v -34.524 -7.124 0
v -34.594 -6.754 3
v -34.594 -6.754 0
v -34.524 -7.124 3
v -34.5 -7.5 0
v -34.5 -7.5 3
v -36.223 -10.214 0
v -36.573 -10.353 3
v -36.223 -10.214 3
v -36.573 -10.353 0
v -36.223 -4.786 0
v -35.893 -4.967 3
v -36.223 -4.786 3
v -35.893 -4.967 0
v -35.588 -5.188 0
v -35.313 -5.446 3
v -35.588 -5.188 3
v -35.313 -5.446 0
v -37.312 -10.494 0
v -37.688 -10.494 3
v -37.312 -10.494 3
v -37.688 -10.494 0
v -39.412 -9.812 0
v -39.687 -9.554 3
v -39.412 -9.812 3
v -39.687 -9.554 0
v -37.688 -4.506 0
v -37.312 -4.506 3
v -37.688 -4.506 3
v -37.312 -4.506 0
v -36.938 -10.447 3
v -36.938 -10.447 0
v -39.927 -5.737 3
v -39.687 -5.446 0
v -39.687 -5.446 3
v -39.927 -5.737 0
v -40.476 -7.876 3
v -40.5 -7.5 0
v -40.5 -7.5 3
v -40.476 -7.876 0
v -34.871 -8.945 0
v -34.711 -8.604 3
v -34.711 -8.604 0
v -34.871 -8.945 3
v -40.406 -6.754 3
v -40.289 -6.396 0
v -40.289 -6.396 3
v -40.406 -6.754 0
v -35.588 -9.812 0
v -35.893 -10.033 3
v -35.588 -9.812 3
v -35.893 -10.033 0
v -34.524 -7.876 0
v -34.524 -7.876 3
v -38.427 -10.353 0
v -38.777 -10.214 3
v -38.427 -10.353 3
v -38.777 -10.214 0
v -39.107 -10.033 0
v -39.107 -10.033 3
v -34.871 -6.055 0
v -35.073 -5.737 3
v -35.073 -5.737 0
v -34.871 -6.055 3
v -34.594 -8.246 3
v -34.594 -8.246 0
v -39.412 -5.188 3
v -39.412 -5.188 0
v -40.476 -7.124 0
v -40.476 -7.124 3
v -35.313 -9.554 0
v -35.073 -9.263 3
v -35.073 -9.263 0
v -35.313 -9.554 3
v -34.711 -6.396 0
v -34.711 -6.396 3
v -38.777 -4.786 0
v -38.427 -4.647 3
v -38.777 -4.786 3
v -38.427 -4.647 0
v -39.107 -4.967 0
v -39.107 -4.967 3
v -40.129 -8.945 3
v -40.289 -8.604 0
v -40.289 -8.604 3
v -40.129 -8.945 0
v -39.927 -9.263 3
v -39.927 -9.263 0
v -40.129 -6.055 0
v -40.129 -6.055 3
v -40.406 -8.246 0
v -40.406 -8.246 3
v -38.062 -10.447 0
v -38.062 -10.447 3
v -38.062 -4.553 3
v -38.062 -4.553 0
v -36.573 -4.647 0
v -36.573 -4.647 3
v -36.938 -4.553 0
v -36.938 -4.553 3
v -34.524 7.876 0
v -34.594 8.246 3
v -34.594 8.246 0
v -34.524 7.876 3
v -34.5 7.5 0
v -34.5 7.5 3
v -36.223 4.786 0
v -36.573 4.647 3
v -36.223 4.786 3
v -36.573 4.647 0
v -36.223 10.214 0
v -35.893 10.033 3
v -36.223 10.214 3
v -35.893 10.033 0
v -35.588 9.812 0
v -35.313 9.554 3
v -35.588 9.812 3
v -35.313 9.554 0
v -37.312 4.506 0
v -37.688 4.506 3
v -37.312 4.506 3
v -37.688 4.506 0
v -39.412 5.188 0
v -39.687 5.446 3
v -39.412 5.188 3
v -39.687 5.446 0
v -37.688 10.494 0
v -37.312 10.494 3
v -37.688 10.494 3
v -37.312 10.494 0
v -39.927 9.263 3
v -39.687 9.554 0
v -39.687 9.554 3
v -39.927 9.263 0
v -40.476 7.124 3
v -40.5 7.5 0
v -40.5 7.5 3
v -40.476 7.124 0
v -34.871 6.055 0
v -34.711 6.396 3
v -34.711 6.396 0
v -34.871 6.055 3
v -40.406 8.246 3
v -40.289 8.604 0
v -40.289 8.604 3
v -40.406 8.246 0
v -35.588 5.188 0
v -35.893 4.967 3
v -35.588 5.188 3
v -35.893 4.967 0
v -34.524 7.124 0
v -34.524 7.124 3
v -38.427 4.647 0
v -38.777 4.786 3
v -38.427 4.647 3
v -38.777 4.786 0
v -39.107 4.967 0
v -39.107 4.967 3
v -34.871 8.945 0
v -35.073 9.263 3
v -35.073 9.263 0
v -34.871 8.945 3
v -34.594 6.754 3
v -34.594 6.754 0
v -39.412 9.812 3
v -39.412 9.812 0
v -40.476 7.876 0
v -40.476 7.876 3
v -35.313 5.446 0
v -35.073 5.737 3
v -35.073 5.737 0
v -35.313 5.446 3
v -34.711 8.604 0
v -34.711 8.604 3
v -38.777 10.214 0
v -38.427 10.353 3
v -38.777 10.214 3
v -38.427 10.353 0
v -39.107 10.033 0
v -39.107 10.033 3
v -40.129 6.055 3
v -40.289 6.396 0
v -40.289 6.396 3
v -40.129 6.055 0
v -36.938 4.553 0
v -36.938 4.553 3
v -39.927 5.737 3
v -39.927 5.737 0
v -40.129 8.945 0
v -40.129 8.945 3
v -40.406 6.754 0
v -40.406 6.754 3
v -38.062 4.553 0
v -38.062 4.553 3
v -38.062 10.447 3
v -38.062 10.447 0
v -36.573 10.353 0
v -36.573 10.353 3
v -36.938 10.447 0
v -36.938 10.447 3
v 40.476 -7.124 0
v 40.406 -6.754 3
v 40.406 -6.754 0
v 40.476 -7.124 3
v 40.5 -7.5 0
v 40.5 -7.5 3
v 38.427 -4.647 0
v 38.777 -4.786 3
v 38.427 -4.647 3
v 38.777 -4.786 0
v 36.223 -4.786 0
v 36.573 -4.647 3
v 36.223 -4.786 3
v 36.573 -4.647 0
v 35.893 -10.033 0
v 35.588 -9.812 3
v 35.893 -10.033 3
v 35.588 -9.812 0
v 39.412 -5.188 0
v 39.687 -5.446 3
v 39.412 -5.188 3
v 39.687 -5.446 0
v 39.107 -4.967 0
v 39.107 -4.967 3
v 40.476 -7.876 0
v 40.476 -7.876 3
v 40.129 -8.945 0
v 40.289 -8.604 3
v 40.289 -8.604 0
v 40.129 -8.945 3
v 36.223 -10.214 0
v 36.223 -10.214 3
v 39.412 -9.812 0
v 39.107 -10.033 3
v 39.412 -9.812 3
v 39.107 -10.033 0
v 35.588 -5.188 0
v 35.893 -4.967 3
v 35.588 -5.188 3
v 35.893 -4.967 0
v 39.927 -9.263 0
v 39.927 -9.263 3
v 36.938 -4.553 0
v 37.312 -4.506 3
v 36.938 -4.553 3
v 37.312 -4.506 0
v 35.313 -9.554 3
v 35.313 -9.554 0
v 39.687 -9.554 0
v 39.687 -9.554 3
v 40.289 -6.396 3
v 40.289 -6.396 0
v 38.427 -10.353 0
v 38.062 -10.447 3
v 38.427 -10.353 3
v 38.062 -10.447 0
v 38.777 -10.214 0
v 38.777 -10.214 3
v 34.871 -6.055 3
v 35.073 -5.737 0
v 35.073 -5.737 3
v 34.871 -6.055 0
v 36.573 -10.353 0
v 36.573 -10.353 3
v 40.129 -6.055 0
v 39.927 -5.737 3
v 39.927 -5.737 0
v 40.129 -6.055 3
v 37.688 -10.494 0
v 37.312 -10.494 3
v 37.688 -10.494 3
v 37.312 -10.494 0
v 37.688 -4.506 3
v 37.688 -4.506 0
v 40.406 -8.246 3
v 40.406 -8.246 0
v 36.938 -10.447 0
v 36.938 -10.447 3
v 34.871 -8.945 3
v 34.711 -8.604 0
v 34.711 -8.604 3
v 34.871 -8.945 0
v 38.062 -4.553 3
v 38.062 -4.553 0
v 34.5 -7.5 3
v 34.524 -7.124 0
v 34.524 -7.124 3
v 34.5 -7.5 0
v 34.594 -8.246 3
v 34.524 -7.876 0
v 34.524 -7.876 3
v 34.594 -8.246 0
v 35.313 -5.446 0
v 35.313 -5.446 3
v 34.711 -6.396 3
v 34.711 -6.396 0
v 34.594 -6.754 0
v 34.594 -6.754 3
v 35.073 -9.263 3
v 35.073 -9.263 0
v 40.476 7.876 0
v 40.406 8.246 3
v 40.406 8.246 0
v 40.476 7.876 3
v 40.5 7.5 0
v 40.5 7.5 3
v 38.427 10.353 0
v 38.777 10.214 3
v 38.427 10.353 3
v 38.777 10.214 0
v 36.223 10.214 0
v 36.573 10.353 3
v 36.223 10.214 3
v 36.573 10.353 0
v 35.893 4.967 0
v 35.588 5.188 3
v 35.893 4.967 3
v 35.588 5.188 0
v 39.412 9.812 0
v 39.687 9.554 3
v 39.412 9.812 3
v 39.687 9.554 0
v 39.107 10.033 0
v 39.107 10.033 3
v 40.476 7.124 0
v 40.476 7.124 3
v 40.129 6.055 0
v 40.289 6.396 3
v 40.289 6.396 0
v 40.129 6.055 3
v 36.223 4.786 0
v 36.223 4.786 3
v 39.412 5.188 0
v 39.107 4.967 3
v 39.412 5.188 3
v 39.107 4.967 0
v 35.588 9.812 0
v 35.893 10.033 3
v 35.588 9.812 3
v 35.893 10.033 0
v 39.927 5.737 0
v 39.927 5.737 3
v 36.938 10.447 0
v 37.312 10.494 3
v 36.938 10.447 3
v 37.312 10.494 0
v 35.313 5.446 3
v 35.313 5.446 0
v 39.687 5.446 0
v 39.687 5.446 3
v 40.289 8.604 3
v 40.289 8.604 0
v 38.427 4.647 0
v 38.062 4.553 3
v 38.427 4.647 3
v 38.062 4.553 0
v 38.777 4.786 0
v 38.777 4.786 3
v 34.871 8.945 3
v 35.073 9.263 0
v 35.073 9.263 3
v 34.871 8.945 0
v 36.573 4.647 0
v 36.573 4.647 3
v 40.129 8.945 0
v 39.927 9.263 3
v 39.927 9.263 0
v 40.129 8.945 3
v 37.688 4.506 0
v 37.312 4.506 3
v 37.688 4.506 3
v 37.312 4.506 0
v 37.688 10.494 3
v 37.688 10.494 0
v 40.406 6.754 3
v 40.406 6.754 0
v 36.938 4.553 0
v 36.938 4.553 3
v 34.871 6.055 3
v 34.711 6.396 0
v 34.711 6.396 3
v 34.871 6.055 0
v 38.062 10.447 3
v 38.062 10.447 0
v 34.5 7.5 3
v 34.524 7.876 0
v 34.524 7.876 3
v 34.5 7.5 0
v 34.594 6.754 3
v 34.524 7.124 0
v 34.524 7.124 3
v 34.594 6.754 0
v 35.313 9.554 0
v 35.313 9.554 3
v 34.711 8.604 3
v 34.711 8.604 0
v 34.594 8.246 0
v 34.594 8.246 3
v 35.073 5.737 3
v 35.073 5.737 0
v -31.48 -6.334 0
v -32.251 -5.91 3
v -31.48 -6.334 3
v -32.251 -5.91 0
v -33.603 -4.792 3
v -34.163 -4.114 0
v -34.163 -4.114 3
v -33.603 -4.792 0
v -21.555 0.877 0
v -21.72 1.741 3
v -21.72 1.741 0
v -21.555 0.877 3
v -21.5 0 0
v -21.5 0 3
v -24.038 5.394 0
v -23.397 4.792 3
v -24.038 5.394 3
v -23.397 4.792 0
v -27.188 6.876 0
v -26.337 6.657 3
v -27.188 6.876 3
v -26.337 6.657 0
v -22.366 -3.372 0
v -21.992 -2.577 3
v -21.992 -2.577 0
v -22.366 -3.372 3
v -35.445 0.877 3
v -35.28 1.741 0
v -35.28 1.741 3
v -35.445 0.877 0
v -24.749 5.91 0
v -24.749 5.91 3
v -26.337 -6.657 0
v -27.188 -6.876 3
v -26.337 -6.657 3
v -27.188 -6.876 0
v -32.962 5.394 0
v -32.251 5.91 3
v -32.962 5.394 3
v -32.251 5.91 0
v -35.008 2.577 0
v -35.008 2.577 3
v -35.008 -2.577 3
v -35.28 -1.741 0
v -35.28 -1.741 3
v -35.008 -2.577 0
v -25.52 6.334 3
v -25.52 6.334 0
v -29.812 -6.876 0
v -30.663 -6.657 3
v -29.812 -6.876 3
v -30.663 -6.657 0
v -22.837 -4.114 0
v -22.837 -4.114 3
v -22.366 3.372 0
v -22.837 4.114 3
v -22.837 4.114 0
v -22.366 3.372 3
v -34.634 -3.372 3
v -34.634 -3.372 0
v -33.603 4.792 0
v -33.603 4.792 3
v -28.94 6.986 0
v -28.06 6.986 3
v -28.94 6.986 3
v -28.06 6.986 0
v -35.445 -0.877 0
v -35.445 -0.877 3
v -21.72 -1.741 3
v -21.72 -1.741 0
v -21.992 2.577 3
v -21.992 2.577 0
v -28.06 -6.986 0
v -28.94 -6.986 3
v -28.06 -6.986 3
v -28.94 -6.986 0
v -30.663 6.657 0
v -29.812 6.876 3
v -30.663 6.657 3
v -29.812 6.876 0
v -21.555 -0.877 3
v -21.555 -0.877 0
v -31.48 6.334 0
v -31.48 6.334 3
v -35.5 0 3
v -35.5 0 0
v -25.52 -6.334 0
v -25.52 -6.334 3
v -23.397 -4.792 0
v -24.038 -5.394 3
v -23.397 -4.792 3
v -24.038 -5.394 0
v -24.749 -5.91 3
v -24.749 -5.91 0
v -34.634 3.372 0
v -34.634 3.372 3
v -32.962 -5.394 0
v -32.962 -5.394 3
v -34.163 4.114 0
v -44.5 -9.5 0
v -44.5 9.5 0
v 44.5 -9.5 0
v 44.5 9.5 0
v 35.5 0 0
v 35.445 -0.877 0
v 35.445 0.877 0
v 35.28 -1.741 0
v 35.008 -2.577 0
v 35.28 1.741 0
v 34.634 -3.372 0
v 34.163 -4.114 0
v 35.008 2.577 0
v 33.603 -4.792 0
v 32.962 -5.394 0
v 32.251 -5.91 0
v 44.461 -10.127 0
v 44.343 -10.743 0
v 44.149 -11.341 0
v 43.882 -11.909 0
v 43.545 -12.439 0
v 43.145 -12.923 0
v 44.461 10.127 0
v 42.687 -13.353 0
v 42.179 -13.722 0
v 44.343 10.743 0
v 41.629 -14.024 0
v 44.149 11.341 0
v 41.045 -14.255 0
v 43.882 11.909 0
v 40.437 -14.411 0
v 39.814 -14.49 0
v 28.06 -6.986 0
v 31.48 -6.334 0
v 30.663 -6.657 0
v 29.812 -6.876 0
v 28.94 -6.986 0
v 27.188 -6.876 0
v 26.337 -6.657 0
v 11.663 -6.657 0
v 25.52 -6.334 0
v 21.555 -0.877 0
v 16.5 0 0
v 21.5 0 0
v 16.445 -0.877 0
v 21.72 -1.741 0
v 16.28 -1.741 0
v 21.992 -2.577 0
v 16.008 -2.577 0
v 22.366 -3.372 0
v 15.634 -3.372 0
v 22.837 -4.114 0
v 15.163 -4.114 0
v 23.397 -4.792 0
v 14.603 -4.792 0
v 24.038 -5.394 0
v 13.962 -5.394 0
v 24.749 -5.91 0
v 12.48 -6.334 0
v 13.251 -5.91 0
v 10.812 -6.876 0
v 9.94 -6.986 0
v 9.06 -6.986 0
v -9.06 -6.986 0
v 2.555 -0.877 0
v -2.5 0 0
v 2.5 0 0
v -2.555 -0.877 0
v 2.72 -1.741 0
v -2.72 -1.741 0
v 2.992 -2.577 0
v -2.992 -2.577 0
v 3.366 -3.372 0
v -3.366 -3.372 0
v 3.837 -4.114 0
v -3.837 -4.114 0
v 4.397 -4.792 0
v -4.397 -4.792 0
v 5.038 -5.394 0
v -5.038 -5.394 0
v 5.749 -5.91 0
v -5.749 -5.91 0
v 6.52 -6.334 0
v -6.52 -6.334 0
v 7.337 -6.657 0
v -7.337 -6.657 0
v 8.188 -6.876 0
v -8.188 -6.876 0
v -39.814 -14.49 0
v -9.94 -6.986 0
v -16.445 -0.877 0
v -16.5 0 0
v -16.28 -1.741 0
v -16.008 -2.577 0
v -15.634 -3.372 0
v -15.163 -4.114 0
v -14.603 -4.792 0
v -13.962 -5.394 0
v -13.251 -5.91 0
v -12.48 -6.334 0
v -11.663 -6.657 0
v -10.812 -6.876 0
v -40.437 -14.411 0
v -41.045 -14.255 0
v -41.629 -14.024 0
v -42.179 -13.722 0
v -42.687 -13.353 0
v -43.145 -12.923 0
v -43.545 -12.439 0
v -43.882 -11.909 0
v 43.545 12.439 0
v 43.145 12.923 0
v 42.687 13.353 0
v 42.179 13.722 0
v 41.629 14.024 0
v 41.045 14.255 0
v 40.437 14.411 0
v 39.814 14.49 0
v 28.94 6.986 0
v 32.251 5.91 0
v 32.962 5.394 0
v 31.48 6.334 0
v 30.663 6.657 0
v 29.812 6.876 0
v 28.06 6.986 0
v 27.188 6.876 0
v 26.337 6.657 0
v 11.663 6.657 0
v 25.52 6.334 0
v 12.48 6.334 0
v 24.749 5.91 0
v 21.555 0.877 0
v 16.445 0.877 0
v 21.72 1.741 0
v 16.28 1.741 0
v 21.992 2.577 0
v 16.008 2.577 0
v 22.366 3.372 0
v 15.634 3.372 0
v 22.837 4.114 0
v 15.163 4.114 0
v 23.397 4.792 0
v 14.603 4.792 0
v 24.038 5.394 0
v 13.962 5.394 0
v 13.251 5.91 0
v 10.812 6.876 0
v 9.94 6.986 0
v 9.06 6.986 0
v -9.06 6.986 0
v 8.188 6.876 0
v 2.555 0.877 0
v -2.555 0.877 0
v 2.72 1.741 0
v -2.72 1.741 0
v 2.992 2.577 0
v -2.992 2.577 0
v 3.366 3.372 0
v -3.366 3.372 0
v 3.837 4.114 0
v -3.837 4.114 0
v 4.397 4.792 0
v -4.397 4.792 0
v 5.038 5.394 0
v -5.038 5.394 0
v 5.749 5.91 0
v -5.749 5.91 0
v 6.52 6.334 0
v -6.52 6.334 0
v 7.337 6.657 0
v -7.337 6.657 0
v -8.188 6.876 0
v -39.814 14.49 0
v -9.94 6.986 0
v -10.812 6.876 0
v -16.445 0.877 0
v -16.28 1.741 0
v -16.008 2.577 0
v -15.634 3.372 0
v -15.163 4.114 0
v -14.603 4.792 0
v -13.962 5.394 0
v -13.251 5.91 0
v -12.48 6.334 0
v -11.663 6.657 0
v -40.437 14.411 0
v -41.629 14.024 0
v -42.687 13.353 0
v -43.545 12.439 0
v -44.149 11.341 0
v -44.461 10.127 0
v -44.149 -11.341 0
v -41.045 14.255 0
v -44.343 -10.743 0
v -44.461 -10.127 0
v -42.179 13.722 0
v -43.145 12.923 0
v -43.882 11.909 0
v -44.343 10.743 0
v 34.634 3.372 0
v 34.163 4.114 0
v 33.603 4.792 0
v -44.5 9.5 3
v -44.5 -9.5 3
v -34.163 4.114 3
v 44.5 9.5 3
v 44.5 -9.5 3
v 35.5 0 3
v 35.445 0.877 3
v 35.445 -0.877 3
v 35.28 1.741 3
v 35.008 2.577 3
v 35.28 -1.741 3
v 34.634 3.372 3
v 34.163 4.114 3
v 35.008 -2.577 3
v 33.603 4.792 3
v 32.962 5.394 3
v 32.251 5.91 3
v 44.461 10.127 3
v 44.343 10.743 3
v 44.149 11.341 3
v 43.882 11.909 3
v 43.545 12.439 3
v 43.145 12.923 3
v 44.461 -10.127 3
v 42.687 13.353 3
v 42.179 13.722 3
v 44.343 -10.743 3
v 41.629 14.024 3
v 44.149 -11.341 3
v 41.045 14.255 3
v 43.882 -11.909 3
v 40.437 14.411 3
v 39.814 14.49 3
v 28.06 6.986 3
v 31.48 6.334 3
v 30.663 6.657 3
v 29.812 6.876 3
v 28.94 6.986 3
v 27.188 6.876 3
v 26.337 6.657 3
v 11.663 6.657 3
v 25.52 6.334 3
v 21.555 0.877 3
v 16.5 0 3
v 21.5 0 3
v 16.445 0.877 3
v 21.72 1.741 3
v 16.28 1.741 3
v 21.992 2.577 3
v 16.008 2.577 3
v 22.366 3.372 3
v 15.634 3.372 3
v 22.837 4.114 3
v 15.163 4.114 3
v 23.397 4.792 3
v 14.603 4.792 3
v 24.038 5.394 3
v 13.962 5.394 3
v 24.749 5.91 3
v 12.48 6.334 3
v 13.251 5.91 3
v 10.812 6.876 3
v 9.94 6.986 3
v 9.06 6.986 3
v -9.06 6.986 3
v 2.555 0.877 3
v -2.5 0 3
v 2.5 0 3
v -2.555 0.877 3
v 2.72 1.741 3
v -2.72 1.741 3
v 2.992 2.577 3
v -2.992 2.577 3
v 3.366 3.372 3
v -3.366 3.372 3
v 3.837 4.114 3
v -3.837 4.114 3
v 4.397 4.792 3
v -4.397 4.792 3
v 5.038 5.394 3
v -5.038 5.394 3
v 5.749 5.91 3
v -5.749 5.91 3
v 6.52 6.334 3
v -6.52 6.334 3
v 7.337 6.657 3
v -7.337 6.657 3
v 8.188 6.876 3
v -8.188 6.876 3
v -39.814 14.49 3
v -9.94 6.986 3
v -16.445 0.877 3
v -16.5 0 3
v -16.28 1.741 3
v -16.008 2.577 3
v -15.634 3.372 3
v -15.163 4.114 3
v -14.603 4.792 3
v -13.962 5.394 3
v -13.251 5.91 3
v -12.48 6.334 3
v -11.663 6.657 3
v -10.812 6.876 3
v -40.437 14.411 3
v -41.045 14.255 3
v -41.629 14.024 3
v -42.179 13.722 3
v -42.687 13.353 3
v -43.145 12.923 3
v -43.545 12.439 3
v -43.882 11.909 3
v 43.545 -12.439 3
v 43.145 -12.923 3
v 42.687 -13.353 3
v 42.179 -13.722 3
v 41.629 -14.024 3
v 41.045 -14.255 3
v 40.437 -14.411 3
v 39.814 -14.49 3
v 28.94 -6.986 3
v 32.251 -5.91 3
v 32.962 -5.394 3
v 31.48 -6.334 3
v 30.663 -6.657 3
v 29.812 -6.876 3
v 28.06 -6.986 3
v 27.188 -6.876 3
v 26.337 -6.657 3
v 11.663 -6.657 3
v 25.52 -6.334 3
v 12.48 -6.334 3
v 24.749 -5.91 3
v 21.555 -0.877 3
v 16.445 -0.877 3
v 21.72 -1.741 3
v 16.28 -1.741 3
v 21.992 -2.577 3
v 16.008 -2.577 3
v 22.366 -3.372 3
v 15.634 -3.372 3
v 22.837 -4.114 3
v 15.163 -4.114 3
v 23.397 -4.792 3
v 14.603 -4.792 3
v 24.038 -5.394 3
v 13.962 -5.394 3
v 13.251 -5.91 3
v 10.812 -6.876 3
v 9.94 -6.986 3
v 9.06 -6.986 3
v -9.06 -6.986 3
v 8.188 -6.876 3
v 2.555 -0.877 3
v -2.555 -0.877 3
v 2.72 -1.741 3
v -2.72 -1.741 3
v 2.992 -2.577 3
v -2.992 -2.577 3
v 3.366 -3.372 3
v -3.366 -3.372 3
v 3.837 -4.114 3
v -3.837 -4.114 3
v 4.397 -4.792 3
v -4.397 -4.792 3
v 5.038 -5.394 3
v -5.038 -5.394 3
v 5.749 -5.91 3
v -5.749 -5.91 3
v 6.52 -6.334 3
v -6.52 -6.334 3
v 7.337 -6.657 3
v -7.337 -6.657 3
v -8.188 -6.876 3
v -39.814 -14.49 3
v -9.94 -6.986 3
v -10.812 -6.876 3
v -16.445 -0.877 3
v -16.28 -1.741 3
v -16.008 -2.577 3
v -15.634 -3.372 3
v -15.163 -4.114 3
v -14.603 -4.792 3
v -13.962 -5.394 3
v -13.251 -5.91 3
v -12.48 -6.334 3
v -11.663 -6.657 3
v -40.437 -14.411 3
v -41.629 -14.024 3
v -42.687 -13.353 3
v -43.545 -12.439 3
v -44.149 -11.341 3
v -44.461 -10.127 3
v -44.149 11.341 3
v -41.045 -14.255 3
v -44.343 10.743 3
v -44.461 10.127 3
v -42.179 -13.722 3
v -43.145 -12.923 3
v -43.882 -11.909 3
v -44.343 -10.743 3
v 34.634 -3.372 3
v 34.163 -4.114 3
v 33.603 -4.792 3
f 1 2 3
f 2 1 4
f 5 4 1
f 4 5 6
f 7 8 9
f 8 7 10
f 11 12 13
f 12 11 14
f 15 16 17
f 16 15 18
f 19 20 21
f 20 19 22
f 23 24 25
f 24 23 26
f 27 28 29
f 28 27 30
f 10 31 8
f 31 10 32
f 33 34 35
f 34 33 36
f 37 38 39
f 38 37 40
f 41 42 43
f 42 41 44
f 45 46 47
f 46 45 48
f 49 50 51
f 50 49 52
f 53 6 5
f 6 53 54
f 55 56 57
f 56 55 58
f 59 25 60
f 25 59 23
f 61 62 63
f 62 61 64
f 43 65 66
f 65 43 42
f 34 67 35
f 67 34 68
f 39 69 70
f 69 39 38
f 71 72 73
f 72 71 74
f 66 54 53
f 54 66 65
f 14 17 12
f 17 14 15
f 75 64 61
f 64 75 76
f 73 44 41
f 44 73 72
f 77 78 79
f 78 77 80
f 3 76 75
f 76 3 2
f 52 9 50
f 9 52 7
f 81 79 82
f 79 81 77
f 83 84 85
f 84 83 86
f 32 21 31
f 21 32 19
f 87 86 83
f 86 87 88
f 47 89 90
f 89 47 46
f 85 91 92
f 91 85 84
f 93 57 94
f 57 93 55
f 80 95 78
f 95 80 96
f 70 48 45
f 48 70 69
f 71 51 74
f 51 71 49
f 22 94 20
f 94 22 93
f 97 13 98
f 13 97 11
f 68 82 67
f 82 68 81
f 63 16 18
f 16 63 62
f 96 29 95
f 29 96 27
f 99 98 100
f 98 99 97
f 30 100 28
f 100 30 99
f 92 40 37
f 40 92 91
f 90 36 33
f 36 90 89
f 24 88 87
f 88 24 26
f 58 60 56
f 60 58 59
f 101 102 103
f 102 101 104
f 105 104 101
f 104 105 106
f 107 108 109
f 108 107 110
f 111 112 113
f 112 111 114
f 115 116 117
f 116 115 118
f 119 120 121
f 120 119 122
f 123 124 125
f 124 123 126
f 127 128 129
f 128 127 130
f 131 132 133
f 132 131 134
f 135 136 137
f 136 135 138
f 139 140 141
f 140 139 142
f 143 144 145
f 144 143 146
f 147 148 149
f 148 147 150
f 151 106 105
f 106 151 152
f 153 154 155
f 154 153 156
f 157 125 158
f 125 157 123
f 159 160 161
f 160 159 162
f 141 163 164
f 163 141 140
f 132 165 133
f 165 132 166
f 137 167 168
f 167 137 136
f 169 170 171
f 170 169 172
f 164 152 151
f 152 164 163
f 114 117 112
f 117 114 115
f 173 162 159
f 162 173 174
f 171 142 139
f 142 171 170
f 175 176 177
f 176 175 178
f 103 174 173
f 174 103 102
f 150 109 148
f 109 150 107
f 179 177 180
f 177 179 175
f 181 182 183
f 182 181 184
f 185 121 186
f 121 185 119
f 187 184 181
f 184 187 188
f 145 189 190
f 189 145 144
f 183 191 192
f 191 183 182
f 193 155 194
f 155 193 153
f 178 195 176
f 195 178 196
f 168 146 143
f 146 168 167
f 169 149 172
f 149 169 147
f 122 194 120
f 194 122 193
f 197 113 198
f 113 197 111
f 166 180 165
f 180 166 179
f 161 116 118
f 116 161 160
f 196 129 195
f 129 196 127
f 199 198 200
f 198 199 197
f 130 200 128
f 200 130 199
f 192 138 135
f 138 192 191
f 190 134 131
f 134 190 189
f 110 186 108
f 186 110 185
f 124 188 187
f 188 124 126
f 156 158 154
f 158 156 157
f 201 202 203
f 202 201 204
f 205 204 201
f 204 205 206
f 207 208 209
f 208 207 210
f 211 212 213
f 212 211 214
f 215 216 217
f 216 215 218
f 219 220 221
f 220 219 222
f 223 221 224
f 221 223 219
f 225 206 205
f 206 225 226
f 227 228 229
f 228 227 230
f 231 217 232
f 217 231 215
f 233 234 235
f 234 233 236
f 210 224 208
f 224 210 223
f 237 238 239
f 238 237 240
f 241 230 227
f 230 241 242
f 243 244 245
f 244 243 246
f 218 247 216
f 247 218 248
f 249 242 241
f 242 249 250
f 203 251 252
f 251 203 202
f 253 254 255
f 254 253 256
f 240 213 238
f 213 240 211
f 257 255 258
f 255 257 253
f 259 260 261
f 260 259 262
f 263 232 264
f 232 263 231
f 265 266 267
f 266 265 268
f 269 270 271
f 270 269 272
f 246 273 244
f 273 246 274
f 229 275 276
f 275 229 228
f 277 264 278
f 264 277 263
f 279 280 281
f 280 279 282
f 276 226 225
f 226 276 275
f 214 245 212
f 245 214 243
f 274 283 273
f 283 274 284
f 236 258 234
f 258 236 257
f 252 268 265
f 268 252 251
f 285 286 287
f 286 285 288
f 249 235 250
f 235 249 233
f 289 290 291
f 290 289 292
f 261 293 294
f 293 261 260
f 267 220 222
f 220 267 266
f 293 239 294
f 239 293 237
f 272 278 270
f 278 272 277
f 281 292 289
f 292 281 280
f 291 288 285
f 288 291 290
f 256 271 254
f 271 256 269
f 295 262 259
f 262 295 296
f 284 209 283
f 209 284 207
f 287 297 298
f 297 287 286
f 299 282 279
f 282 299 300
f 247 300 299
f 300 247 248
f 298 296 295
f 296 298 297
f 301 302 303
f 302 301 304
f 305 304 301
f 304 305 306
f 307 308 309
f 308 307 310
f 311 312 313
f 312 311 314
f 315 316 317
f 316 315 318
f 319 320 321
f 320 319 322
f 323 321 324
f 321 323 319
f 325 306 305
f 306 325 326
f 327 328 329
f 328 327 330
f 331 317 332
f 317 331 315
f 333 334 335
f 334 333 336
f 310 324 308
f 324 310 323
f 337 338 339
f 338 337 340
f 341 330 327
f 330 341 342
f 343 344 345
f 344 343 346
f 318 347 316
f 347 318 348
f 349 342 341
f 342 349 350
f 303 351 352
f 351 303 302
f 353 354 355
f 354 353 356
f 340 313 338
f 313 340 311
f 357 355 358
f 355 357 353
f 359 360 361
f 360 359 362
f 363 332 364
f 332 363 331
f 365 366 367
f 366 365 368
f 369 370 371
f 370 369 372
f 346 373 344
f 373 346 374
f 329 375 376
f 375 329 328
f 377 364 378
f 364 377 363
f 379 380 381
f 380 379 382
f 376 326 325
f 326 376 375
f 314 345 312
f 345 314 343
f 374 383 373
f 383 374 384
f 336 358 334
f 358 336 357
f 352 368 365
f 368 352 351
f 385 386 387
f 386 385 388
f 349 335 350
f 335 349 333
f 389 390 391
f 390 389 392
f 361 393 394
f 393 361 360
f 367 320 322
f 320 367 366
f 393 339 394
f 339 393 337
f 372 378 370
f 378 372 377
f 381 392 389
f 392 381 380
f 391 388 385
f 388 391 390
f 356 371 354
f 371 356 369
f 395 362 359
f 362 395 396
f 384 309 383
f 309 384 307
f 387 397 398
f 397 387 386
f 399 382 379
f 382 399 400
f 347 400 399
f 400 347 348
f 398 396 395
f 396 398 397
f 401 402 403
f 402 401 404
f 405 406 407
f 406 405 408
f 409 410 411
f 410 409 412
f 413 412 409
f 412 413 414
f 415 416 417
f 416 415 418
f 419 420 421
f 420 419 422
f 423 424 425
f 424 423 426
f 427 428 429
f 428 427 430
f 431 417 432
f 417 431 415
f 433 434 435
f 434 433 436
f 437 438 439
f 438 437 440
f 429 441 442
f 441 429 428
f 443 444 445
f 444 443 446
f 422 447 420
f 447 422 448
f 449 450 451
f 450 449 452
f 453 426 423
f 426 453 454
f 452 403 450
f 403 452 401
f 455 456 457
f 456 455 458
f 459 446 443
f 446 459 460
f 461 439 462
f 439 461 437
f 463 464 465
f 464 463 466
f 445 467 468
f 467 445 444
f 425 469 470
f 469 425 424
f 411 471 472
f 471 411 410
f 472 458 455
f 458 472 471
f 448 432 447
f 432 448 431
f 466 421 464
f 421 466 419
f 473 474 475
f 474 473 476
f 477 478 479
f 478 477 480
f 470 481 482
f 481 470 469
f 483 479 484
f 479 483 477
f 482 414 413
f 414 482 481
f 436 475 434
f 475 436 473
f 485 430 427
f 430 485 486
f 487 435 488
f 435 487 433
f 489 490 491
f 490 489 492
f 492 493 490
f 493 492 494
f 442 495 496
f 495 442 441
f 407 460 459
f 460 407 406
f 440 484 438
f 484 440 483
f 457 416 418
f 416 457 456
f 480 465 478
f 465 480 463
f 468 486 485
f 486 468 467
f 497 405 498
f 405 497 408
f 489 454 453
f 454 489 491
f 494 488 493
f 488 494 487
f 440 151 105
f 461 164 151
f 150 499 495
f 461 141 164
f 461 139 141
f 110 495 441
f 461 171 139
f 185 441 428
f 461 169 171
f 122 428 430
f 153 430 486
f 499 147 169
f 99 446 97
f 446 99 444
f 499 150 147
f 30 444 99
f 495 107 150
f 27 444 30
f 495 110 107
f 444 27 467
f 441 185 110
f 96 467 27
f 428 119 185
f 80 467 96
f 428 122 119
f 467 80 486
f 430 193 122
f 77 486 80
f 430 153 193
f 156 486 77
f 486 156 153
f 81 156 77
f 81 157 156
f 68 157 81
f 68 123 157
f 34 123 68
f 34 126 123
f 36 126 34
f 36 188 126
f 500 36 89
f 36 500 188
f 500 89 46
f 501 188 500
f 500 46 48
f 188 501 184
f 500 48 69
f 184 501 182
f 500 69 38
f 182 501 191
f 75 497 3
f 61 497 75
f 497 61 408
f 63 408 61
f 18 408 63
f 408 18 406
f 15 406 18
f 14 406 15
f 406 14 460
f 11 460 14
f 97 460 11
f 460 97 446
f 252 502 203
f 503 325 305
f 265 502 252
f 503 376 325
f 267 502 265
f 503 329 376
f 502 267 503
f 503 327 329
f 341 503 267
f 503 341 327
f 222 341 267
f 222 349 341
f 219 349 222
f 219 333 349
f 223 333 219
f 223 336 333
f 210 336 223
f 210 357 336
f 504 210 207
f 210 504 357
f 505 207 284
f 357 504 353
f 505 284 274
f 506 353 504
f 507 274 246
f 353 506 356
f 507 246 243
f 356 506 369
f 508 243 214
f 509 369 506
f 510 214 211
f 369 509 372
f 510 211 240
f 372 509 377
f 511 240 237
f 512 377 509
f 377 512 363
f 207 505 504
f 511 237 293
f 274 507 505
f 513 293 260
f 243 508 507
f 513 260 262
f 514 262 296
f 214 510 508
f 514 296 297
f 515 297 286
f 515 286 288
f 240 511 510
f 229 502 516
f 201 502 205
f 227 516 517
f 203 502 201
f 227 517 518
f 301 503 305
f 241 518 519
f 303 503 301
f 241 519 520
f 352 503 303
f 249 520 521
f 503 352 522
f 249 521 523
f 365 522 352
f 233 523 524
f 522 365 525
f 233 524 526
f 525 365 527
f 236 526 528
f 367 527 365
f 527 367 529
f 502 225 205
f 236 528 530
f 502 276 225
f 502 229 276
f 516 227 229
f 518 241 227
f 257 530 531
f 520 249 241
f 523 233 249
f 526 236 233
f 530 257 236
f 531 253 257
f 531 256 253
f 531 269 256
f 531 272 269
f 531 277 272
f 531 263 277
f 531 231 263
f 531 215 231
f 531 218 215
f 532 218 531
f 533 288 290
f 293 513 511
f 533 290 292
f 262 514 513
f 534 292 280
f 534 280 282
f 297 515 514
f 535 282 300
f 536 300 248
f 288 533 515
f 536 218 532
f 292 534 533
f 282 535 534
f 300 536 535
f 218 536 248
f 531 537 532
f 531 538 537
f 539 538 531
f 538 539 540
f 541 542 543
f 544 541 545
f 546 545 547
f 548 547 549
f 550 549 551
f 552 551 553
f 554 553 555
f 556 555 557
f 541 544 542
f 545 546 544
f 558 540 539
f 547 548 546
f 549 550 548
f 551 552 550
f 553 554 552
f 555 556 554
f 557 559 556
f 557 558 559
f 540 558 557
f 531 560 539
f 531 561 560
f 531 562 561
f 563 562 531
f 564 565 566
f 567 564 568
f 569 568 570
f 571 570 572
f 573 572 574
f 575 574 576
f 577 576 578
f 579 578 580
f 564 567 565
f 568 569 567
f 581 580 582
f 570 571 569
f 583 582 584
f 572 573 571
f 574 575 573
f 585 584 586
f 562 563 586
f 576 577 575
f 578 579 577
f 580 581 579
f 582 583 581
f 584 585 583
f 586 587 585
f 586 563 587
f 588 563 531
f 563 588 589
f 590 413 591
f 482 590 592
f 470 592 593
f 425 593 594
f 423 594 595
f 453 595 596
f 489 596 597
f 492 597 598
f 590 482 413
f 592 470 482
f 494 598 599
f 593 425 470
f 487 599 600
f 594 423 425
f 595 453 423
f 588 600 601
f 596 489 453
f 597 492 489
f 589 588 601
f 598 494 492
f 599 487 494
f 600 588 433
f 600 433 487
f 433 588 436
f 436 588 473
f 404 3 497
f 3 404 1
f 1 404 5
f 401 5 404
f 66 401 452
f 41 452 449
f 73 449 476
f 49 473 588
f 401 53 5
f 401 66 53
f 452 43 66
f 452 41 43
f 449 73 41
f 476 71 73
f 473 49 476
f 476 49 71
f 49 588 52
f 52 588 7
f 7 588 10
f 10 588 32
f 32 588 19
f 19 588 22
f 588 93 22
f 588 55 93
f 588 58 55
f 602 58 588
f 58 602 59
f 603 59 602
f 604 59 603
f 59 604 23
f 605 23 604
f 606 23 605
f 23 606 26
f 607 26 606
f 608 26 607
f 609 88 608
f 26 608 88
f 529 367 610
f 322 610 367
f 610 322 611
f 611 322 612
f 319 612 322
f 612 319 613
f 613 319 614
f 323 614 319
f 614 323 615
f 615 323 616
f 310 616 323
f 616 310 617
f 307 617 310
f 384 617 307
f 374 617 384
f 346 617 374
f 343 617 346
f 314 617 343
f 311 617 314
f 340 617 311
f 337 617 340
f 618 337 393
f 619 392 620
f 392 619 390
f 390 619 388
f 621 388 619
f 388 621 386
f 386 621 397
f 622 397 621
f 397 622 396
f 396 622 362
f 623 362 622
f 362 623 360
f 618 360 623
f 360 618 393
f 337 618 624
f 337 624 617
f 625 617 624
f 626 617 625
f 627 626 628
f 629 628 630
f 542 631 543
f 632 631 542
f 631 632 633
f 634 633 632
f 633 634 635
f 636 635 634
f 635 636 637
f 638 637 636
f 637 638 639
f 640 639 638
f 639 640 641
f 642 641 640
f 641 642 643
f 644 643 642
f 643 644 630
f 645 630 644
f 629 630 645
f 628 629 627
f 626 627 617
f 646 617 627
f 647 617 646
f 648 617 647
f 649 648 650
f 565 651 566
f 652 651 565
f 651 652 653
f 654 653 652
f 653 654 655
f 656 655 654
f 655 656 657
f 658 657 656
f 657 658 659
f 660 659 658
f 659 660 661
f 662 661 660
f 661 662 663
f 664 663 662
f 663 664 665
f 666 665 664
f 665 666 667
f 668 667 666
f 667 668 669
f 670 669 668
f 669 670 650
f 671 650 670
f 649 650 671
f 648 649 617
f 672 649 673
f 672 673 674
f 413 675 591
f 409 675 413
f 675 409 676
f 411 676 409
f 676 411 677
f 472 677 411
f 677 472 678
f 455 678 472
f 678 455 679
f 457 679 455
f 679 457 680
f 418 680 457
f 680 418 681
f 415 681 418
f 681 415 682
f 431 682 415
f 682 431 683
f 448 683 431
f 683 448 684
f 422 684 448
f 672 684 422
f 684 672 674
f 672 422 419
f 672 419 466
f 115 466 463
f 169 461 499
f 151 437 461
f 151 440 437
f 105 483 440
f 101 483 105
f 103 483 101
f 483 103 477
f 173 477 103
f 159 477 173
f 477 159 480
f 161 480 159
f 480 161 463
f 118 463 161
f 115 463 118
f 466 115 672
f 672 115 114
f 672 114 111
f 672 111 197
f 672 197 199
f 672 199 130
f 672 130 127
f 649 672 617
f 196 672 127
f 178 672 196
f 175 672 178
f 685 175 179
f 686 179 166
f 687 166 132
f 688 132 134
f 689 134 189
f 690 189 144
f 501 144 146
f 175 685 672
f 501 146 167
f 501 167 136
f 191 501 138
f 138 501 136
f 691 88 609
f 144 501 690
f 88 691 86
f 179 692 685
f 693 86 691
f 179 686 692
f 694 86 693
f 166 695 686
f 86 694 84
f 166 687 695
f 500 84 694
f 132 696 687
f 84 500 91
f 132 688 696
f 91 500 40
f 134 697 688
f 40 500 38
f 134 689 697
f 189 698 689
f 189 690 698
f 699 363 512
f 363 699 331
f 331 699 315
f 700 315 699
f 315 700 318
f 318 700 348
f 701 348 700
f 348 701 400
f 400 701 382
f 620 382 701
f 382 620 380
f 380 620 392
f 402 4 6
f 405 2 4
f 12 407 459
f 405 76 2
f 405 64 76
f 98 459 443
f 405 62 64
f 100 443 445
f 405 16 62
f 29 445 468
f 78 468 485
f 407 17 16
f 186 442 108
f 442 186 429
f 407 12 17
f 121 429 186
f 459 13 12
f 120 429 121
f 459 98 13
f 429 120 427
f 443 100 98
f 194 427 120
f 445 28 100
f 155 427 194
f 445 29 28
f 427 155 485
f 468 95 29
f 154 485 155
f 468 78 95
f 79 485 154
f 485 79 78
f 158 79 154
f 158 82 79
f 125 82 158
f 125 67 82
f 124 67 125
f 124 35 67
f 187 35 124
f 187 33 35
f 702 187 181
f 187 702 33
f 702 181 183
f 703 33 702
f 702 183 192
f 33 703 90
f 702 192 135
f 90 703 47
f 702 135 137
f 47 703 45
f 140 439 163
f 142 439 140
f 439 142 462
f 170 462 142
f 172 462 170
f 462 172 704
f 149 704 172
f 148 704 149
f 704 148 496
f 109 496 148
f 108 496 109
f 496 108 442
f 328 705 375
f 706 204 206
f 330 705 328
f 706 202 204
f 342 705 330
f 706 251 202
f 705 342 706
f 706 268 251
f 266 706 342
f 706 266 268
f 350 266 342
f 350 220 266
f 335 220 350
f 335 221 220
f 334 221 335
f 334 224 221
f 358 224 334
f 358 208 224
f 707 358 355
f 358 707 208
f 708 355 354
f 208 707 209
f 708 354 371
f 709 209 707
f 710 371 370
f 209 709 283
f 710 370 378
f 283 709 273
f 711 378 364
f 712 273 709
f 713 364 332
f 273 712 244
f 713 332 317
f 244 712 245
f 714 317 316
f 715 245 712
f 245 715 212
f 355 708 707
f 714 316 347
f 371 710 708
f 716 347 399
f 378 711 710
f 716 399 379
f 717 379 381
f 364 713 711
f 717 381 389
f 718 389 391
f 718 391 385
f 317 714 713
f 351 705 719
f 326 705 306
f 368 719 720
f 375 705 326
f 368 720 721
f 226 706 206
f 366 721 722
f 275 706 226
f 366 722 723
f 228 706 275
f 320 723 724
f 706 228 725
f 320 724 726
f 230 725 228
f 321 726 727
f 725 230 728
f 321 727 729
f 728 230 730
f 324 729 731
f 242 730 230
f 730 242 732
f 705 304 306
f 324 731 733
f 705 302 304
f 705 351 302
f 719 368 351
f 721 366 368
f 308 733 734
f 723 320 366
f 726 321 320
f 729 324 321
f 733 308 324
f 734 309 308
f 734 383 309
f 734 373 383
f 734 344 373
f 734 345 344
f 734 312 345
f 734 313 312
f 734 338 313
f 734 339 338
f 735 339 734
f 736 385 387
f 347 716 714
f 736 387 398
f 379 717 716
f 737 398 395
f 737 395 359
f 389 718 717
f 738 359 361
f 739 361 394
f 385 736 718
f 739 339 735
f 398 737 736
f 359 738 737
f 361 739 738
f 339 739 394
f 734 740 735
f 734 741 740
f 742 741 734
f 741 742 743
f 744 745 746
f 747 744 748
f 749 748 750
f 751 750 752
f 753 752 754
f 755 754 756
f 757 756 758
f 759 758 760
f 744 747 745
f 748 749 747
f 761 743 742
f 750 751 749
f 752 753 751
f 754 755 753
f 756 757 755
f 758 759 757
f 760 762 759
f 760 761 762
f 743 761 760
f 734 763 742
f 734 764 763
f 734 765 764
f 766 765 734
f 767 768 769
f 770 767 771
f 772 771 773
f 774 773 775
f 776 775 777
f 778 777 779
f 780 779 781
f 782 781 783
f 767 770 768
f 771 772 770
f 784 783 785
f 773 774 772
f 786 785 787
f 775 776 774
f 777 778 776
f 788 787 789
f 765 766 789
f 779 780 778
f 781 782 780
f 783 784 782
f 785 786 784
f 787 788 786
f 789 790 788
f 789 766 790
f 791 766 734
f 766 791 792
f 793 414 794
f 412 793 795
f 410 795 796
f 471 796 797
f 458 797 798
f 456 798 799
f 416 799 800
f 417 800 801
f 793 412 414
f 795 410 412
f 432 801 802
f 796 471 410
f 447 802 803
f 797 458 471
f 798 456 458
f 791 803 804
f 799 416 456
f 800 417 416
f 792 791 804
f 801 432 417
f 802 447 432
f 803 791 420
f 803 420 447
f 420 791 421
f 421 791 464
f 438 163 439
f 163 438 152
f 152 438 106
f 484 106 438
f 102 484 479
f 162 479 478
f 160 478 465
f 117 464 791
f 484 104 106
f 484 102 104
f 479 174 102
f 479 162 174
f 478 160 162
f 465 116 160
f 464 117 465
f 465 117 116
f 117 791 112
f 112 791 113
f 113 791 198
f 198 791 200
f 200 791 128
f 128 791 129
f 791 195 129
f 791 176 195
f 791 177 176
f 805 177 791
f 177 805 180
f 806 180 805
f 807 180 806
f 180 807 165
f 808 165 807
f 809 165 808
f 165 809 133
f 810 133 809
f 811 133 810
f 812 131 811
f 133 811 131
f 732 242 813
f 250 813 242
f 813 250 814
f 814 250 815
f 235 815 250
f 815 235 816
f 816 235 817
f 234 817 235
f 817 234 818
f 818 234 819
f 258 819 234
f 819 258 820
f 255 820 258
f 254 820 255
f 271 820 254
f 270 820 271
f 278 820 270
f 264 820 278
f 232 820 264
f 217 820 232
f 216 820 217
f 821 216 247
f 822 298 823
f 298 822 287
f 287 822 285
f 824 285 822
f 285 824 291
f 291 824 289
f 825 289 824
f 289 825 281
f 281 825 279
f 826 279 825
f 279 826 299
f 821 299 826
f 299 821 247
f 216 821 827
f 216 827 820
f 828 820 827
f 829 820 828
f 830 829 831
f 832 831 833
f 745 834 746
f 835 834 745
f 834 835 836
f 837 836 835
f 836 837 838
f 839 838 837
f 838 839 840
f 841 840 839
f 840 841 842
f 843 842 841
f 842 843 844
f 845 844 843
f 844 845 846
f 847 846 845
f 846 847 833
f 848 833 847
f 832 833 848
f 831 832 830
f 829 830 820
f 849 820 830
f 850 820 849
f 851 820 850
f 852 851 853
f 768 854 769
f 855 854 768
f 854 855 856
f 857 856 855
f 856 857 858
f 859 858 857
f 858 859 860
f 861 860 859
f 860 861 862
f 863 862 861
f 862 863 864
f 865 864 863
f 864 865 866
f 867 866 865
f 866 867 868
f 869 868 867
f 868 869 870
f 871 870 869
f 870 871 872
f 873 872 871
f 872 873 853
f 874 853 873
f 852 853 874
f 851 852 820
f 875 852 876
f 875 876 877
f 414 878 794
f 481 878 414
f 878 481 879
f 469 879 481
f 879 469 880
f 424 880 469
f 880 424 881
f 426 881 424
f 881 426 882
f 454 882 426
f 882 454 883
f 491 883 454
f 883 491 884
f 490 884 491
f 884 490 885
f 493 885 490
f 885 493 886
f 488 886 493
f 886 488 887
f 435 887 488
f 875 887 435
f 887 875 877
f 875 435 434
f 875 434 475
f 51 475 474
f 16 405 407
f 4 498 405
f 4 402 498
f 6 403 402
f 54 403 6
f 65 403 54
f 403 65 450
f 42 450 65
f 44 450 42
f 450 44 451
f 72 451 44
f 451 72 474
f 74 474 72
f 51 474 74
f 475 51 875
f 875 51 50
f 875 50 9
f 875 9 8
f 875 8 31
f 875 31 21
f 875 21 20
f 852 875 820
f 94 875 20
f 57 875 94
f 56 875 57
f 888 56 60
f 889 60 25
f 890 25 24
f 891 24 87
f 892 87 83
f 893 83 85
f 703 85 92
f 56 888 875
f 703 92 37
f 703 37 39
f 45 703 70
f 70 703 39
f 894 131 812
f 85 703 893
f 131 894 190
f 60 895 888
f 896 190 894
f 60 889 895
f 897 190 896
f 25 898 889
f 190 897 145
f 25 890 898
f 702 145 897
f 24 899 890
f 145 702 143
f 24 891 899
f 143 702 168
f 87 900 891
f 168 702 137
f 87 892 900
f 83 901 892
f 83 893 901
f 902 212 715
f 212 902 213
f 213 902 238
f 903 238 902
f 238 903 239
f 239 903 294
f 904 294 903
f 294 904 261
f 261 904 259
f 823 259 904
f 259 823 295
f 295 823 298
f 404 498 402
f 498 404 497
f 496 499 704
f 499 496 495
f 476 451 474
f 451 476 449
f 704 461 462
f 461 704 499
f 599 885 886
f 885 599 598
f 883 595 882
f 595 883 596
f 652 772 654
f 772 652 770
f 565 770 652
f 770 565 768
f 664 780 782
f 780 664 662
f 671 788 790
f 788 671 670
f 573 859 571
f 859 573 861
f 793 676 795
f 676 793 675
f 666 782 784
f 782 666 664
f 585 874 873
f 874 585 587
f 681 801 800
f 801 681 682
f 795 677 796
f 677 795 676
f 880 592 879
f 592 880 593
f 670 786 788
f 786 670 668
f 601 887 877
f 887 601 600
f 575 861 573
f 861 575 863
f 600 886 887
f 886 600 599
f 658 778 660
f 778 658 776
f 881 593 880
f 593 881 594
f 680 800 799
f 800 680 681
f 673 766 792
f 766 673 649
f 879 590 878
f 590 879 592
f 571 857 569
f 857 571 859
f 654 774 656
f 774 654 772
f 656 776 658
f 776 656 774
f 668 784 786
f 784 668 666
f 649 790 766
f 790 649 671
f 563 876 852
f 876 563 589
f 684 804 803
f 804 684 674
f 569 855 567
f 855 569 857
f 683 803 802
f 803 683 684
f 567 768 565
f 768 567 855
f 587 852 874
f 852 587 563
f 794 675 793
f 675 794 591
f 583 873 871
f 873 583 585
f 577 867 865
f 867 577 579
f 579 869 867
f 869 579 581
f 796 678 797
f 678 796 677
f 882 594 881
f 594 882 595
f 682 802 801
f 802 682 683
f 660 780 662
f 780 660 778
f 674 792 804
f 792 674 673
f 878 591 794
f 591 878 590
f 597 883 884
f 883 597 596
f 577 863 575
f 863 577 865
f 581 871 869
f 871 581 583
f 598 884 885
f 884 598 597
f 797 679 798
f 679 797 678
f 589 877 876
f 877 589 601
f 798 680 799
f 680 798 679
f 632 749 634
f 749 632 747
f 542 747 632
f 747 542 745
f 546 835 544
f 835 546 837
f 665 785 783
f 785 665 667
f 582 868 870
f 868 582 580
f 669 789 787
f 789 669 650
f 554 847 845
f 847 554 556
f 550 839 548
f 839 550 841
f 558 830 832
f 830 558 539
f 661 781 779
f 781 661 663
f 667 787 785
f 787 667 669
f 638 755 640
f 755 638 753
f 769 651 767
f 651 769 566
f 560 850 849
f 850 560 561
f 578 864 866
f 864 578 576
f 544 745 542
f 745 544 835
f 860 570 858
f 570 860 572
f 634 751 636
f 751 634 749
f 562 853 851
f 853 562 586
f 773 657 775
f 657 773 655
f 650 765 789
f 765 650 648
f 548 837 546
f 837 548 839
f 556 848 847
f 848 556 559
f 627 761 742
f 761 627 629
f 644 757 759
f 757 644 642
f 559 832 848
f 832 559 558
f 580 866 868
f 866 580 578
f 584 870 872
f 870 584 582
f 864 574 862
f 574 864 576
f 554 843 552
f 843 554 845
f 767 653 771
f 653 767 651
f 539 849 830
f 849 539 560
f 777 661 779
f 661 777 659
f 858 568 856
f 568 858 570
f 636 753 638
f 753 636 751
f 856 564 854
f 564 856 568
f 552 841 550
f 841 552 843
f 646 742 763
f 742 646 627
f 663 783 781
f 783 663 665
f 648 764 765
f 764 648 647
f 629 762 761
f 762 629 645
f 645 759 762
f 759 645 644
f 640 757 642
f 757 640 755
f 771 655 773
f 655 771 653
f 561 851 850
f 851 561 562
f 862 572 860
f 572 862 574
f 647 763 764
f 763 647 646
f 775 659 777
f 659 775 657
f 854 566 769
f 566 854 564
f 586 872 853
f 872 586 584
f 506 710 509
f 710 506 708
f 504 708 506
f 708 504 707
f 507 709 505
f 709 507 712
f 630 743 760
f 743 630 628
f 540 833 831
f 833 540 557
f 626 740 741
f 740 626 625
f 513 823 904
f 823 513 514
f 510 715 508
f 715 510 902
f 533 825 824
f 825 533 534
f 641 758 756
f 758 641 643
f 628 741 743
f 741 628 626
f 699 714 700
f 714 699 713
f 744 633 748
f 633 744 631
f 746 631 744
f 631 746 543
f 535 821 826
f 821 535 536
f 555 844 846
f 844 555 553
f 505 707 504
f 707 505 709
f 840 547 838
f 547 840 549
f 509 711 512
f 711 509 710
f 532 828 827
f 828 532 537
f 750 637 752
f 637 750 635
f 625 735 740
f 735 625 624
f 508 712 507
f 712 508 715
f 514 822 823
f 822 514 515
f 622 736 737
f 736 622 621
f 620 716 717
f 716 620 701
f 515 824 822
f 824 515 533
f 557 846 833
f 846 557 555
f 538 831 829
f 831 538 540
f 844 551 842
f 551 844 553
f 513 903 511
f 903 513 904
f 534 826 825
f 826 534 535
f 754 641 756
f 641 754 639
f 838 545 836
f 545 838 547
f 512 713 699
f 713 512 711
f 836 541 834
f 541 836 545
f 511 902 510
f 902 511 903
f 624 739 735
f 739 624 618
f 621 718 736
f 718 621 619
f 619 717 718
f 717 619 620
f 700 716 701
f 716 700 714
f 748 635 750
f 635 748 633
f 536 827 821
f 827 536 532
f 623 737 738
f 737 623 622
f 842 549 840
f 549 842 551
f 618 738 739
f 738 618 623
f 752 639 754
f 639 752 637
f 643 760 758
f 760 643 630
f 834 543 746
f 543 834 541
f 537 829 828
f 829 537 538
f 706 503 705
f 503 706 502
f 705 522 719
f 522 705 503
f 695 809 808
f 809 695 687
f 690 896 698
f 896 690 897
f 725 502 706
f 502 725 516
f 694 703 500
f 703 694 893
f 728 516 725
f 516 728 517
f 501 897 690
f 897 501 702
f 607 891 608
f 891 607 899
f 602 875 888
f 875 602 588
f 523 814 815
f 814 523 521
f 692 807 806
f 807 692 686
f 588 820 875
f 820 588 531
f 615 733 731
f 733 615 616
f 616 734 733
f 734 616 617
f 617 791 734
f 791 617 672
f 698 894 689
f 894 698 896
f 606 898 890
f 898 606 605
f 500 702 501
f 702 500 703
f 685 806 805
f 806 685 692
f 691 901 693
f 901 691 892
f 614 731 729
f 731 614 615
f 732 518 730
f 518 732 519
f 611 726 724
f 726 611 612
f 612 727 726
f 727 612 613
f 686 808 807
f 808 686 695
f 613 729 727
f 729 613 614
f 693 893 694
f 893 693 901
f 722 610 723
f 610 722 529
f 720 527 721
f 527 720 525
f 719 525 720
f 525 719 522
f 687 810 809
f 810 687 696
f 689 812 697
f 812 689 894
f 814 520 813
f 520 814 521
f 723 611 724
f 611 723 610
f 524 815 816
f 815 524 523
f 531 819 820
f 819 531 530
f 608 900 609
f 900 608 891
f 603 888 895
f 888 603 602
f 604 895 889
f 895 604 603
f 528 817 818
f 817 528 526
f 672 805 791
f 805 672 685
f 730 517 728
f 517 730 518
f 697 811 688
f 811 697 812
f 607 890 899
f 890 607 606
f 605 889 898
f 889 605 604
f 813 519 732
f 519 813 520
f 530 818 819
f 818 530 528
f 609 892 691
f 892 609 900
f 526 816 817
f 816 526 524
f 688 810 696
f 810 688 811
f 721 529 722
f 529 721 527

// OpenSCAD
$fn = 50;


difference() {
	union() {
		hull() {
			translate(v = [-39.5000000000, 9.5000000000, 0]) {
				cylinder(h = 3, r = 5);
			}
			translate(v = [39.5000000000, 9.5000000000, 0]) {
				cylinder(h = 3, r = 5);
			}
			translate(v = [-39.5000000000, -9.5000000000, 0]) {
				cylinder(h = 3, r = 5);
			}
			translate(v = [39.5000000000, -9.5000000000, 0]) {
				cylinder(h = 3, r = 5);
			}
		}
	}
	union() {
		#translate(v = [-37.5000000000, -7.5000000000, -100.0000000000]) {
			cylinder(h = 200, r = 3.0000000000);
		}
		#translate(v = [-37.5000000000, 7.5000000000, -100.0000000000]) {
			cylinder(h = 200, r = 3.0000000000);
		}
		#translate(v = [37.5000000000, -7.5000000000, -100.0000000000]) {
			cylinder(h = 200, r = 3.0000000000);
		}
		#translate(v = [37.5000000000, 7.5000000000, -100.0000000000]) {
			cylinder(h = 200, r = 3.0000000000);
		}
		#translate(v = [-28.5000000000, 0, 0]) {
			cylinder(h = 3, r = 7.0000000000);
		}
		#translate(v = [-9.5000000000, 0, 0]) {
			cylinder(h = 3, r = 7.0000000000);
		}
		#translate(v = [9.5000000000, 0, 0]) {
			cylinder(h = 3, r = 7.0000000000);
		}
		#translate(v = [28.5000000000, 0, 0]) {
			cylinder(h = 3, r = 7.0000000000);
		}
	}
}
